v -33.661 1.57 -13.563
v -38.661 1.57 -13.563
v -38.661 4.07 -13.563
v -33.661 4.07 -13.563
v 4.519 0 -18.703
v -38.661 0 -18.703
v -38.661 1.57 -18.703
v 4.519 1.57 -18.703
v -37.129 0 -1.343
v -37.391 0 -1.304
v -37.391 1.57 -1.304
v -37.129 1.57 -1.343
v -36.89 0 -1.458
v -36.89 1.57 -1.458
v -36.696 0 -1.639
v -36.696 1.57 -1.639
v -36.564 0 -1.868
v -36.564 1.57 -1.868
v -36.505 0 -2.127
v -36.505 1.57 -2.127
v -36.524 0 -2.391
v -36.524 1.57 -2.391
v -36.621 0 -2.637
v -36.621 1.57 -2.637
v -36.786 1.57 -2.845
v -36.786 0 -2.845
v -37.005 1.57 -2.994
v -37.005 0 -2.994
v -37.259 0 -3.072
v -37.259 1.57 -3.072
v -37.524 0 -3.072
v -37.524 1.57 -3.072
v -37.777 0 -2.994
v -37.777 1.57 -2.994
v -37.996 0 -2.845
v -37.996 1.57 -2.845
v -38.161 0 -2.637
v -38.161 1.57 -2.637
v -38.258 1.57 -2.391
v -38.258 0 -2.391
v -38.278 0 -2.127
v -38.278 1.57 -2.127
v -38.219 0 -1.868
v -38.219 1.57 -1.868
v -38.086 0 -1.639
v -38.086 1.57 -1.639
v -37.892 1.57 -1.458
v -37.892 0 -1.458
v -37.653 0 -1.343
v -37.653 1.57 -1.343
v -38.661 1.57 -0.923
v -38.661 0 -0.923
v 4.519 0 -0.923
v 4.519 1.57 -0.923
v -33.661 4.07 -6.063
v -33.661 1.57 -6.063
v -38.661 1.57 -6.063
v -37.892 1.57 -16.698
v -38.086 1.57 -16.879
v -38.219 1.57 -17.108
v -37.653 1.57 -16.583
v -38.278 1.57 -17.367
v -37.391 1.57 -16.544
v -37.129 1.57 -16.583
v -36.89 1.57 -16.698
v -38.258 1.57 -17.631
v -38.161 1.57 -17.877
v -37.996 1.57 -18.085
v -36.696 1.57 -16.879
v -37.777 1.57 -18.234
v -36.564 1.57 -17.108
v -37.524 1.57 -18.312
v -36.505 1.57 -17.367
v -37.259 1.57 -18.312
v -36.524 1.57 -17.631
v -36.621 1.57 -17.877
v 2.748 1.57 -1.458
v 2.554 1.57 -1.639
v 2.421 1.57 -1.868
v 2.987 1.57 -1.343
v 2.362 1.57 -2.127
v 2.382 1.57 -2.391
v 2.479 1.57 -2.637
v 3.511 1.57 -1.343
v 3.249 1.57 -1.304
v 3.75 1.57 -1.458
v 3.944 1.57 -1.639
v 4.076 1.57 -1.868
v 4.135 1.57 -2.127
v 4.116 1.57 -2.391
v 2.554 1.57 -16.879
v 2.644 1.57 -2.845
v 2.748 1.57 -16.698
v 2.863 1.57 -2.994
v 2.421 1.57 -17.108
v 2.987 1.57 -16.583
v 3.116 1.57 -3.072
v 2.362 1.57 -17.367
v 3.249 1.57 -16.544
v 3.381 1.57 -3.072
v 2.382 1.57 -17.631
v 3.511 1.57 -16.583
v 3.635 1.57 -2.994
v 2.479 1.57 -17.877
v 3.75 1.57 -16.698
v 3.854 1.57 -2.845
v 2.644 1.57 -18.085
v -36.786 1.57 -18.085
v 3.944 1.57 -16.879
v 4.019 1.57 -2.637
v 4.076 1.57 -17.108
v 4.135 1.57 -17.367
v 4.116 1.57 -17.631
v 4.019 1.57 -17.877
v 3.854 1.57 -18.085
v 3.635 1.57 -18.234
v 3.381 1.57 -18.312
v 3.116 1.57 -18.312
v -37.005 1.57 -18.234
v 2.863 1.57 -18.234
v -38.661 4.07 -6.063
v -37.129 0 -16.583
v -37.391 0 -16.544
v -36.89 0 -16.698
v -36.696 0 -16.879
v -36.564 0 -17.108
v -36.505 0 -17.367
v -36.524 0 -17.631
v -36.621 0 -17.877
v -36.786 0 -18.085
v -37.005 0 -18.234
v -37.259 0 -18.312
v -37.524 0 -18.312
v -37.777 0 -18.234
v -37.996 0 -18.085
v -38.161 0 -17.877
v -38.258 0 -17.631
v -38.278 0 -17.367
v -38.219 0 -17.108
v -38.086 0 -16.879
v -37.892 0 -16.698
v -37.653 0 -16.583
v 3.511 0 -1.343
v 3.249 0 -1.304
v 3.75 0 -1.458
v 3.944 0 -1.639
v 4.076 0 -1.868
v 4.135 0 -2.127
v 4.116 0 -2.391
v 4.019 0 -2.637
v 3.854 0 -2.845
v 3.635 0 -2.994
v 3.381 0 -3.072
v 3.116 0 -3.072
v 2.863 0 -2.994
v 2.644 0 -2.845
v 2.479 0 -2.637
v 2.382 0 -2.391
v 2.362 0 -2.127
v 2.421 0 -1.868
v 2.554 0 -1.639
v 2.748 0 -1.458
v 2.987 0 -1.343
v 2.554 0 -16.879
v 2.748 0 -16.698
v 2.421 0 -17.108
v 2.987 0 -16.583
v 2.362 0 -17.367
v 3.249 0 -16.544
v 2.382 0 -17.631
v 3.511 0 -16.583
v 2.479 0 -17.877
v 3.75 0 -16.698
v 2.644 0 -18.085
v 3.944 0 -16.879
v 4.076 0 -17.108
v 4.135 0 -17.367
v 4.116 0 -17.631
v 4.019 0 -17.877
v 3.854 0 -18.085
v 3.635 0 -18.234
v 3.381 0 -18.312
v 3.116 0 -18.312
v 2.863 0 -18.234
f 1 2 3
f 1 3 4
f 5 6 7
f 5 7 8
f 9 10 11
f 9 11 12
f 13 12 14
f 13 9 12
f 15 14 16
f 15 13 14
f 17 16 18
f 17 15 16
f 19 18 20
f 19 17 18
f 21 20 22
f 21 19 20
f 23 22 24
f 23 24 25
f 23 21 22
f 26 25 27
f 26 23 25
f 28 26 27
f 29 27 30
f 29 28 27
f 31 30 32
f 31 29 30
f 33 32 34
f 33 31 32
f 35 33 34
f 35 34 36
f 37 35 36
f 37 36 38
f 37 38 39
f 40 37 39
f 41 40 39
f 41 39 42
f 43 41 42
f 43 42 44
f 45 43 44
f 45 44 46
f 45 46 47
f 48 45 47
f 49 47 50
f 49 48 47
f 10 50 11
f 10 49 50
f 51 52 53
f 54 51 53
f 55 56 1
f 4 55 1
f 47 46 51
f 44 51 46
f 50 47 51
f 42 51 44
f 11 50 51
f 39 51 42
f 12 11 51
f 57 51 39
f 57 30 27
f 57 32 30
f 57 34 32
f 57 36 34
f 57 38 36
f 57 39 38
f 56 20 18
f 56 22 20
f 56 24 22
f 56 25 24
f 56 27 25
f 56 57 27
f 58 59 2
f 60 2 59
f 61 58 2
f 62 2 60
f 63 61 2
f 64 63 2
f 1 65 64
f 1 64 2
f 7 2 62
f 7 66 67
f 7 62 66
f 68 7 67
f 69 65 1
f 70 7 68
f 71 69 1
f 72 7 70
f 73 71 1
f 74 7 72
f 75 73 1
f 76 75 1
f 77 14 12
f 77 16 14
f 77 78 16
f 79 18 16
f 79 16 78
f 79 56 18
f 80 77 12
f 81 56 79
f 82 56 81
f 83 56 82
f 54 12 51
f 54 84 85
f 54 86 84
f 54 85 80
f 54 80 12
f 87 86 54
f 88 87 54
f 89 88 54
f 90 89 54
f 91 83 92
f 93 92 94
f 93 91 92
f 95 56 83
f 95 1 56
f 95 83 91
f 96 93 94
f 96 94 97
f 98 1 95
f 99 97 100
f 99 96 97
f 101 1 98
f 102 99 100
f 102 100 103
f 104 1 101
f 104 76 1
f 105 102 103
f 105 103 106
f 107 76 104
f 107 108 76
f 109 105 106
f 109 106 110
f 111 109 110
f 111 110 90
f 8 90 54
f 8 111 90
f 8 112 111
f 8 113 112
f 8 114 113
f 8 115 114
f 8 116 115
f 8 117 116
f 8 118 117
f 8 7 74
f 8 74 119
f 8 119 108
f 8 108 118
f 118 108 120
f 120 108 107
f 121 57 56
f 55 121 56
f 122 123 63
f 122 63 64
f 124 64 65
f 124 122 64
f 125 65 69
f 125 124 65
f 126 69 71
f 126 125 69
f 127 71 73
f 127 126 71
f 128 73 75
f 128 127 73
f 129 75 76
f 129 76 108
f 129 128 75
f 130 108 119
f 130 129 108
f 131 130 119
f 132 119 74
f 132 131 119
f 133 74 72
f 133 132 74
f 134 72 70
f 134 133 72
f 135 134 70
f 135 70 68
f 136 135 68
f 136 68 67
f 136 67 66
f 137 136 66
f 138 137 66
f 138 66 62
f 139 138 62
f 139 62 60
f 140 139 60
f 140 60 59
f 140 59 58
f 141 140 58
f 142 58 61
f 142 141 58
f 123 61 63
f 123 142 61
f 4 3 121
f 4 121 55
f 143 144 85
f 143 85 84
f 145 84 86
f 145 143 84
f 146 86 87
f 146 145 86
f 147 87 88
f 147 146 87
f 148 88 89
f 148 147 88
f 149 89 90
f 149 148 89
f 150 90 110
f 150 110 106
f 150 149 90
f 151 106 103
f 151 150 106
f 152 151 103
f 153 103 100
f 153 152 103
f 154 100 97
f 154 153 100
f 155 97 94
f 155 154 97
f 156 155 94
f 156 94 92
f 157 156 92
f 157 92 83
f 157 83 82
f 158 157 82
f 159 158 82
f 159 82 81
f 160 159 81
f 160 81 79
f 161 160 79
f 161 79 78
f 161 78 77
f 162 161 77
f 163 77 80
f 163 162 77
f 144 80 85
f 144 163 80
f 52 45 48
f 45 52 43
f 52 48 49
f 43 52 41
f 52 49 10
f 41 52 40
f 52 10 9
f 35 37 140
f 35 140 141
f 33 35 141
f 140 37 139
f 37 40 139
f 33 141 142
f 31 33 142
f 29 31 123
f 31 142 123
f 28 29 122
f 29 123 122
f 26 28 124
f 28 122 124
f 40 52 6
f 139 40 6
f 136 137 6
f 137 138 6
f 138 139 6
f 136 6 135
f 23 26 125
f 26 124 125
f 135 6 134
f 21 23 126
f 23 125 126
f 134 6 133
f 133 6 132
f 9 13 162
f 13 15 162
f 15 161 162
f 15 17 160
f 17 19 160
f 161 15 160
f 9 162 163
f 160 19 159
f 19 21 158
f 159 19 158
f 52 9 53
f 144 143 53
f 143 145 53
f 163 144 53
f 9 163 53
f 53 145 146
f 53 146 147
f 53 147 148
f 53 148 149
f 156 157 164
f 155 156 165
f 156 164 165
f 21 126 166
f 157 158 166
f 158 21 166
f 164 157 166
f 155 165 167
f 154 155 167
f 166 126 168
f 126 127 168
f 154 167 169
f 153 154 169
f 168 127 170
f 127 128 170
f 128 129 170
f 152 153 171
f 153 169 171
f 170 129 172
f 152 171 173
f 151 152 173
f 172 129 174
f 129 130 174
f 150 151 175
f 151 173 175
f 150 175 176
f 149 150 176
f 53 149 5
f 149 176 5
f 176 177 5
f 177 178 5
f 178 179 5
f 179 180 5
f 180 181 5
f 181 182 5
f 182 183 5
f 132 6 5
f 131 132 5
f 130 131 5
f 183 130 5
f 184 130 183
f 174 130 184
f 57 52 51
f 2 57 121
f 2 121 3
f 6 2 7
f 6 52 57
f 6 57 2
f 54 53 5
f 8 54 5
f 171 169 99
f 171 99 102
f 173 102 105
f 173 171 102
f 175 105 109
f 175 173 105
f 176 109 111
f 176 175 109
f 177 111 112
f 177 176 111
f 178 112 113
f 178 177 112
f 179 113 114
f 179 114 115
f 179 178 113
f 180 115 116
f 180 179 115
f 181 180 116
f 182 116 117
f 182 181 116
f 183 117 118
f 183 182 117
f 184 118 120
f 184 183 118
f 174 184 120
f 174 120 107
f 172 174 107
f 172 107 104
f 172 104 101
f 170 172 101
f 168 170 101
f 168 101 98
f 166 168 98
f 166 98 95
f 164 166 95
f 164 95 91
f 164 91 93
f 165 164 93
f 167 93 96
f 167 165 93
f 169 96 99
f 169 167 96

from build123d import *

# Parameters (mm, degrees)
SKETCH1_W           = 43.18
SKETCH1_H           = 17.78
SKETCH1_R           = 0.889
BOSS_EXTRUDE1_DEPTH = 1.57
SKETCH2_W           = 5
SKETCH2_H           = 3.75
BOSS_EXTRUDE2_DEPTH = 2.5


with BuildPart() as part:
    # Sketch1 → Boss-Extrude1 (new body)
    with BuildSketch(Plane(origin=(0, 0, 0), x_dir=(1, 0, 0), z_dir=(0, 1, 0))):
        with Locations((-17.071162791, 9.812965116)):
            Rectangle(SKETCH1_W, SKETCH1_H)
        with Locations(Location((-37.391162791, 17.432965116, 0), (0, 0, 270))):
            Circle(SKETCH1_R, mode=Mode.SUBTRACT)
        with Locations(Location((-37.391162791, 2.192965116, 0), (0, 0, 270))):
            Circle(SKETCH1_R, mode=Mode.SUBTRACT)
        with Locations(Location((3.248837209, 2.192965116, 0), (0, 0, 270))):
            Circle(SKETCH1_R, mode=Mode.SUBTRACT)
        with Locations(Location((3.248837209, 17.432965116, 0), (0, 0, 270))):
            Circle(SKETCH1_R, mode=Mode.SUBTRACT)
    extrude(amount=BOSS_EXTRUDE1_DEPTH)

    # Sketch2 → Boss-Extrude2 (add)
    with BuildSketch(Plane(origin=(0, 1.57, 0), x_dir=(1, 0, 0), z_dir=(0, 1, 0))):
        with Locations((-36.161162791, 11.687965116)):
            Rectangle(SKETCH2_W, SKETCH2_H)
        with Locations((-36.161162791, 7.937965116)):
            Rectangle(SKETCH2_W, SKETCH2_H)
    extrude(amount=BOSS_EXTRUDE2_DEPTH)


solid = part.part
